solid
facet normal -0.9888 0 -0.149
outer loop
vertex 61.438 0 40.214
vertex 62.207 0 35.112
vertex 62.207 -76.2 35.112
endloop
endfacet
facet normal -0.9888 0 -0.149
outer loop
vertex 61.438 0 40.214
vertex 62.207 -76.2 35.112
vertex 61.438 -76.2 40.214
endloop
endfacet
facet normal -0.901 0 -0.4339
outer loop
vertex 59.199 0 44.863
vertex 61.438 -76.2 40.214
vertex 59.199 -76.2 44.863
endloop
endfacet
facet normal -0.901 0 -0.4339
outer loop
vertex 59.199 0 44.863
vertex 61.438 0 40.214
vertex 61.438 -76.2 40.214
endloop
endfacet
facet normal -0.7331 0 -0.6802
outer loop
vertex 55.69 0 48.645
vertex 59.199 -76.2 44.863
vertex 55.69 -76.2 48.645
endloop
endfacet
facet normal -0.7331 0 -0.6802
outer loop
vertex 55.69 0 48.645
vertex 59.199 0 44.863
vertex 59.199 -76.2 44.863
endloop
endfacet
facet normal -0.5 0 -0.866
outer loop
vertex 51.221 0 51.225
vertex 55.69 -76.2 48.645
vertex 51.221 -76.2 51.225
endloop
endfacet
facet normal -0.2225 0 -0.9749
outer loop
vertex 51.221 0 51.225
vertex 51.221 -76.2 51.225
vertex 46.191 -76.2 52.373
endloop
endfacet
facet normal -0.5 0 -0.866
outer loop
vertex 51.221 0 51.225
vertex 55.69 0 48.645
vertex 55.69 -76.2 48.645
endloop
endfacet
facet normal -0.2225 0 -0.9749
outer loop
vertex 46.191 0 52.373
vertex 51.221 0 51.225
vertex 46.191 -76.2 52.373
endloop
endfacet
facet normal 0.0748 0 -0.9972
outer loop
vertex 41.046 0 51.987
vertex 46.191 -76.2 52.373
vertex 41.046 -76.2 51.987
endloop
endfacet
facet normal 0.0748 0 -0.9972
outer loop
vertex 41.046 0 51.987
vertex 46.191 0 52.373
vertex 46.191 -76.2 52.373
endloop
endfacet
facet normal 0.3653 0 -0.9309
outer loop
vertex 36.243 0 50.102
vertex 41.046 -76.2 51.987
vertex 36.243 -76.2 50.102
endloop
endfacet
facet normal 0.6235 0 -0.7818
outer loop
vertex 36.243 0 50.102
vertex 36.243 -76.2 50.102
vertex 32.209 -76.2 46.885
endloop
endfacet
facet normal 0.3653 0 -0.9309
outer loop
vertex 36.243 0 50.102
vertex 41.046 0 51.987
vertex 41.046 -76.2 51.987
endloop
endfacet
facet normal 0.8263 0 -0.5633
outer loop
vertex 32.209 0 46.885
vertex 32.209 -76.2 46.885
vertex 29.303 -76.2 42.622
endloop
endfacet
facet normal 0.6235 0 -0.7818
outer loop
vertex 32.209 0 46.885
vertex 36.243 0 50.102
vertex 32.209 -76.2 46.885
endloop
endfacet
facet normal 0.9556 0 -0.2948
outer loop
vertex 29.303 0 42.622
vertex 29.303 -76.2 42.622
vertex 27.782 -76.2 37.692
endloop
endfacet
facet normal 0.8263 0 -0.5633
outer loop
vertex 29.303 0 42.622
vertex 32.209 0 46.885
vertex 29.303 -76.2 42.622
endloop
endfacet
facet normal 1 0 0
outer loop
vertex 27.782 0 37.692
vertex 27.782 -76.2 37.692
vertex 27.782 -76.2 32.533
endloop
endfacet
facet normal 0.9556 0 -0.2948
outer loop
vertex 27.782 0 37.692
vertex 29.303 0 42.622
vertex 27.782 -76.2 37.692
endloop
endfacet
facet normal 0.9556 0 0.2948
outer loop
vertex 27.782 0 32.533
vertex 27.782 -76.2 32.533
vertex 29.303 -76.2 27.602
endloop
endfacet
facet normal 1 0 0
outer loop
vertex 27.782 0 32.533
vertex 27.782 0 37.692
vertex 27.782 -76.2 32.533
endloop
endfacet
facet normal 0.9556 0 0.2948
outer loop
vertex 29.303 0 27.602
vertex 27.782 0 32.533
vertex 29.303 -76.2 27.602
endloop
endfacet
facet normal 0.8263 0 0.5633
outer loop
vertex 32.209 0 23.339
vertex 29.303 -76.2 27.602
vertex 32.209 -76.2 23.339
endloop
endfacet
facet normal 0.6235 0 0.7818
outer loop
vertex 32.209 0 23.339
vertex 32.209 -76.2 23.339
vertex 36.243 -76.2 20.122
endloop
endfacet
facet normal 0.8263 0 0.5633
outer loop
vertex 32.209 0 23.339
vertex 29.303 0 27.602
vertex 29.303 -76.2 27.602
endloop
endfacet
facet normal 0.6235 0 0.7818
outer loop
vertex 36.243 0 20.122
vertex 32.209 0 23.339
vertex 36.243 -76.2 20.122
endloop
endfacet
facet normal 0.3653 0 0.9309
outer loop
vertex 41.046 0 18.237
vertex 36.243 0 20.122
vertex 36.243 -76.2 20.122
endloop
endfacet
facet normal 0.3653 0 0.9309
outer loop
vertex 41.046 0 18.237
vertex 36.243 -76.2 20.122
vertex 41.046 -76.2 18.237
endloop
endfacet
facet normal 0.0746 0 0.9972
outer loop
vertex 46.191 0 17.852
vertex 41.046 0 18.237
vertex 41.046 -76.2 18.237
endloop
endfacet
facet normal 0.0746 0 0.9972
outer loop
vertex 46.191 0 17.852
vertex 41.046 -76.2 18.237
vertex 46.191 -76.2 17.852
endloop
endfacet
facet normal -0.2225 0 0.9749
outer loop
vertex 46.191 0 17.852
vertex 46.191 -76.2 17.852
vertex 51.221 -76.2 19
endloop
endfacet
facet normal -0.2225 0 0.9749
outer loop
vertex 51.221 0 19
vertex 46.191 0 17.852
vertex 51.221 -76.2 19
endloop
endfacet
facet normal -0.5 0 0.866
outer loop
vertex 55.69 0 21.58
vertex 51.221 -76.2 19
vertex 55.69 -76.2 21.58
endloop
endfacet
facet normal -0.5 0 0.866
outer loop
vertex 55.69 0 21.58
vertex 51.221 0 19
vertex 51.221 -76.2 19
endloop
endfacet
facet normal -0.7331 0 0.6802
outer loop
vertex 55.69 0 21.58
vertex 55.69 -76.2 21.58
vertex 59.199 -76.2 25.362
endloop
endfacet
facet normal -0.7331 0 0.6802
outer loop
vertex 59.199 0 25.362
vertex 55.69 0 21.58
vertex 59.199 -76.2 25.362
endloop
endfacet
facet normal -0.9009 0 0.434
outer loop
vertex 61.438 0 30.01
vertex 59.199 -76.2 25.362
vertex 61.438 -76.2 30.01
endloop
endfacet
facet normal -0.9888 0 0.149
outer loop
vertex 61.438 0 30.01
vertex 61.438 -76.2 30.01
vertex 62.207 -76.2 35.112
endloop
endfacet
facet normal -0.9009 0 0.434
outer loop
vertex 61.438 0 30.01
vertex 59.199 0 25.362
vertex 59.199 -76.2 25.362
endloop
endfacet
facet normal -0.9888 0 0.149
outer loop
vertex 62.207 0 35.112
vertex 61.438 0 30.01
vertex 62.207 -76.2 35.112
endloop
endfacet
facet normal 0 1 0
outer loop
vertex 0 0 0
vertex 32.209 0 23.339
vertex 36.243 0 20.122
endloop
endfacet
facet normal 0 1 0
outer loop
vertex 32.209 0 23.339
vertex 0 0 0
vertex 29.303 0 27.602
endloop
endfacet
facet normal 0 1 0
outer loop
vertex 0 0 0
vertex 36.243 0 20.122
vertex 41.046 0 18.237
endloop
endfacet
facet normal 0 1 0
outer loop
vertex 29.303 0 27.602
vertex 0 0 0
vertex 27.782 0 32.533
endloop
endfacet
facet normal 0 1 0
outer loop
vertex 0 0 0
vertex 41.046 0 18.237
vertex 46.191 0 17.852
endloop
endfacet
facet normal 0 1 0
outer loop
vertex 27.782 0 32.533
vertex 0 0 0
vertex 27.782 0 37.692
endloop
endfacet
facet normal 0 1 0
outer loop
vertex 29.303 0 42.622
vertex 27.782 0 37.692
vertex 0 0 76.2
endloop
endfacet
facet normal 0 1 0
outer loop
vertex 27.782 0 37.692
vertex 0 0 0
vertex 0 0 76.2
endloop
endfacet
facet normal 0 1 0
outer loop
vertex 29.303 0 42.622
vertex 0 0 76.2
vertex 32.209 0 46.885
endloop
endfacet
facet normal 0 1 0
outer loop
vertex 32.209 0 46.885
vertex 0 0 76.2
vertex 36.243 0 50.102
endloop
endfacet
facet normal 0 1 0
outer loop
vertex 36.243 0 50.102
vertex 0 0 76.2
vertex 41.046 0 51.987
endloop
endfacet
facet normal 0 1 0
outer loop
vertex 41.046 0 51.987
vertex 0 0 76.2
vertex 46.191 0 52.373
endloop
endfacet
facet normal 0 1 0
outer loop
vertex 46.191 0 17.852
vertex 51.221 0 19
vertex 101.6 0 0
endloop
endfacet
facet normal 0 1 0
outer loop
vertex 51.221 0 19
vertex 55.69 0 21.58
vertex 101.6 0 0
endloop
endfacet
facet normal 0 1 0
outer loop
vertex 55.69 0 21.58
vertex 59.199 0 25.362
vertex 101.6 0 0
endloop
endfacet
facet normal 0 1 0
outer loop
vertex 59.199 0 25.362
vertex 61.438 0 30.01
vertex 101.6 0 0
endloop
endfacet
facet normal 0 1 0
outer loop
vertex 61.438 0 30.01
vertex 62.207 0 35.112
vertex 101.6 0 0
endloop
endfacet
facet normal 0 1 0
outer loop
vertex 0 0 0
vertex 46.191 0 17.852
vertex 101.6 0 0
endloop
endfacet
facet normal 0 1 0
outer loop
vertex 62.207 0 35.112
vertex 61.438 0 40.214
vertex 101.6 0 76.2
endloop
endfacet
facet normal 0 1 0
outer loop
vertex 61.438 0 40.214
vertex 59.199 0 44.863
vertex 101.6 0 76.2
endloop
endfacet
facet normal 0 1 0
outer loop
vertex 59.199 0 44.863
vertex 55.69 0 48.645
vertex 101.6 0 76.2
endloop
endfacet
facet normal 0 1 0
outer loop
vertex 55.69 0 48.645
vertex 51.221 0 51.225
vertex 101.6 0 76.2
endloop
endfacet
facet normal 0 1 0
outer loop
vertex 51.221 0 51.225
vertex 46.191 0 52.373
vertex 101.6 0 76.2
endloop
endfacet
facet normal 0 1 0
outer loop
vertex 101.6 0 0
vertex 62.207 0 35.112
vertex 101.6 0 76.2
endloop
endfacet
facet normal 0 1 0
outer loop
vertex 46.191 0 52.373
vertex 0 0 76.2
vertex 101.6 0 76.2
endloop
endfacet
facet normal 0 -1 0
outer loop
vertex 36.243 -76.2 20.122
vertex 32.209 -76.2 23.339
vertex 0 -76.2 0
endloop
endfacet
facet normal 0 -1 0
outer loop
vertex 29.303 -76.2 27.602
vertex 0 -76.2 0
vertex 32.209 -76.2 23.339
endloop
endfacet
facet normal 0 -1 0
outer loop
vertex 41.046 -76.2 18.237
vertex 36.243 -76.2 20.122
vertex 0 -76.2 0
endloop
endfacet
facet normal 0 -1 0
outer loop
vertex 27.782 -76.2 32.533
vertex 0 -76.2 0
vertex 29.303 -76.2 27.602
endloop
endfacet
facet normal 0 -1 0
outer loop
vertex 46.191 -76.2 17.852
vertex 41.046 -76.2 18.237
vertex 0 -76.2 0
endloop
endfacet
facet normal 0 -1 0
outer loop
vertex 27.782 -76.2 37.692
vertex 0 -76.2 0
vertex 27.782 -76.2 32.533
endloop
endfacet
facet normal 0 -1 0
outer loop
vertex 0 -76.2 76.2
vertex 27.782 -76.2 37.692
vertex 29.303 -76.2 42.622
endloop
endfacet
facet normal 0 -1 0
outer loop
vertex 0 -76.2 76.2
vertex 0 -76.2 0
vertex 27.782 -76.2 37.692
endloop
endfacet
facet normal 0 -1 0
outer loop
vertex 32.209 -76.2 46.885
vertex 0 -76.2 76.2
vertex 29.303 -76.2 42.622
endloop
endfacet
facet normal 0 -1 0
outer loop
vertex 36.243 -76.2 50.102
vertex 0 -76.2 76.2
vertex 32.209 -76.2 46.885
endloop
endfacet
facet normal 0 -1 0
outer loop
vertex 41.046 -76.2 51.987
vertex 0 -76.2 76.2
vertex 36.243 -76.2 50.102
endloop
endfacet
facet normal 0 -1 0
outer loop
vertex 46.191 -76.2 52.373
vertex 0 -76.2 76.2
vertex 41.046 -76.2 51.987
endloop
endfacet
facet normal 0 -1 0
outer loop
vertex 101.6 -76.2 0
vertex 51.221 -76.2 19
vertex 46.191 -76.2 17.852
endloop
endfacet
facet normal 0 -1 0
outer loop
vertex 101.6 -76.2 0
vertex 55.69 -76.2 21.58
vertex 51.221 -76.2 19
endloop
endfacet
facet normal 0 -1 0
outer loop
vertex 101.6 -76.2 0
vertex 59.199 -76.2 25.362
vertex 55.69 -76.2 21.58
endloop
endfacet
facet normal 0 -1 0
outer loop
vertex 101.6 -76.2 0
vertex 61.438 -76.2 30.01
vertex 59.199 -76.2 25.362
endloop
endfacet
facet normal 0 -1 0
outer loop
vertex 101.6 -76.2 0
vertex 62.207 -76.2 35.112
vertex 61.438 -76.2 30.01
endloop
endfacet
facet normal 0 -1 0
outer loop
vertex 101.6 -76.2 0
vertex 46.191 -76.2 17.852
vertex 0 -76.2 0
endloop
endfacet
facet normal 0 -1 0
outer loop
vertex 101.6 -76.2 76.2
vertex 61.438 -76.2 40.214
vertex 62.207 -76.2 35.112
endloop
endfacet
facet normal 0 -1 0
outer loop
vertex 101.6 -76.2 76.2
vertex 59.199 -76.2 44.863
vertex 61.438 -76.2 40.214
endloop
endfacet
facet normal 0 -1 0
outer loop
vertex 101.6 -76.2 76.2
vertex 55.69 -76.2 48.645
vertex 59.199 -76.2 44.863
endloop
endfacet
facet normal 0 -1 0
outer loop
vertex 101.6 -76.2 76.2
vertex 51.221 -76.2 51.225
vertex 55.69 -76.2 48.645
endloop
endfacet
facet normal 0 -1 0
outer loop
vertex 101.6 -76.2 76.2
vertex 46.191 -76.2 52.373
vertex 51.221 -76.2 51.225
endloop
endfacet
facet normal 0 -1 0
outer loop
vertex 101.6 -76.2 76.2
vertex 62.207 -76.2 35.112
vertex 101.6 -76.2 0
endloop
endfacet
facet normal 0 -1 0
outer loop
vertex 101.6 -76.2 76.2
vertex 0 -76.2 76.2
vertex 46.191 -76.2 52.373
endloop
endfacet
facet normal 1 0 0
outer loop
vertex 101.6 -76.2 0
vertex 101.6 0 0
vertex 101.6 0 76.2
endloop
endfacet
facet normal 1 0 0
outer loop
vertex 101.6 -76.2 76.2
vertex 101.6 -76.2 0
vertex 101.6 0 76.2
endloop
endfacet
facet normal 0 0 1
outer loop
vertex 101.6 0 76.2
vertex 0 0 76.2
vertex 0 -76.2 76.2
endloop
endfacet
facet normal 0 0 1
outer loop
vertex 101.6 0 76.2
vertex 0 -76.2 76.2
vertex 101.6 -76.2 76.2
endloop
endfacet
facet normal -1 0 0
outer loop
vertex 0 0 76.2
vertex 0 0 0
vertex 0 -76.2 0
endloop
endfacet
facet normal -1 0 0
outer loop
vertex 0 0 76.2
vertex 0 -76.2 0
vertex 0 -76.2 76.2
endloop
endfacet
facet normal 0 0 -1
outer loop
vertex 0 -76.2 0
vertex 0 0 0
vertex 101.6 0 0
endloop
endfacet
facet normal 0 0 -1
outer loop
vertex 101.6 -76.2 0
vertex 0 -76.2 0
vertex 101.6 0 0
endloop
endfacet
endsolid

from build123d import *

# Parameters (mm, degrees)
F0_W     = 101.6
F0_H     = 76.2
F1_DEPTH = 76.2
F2_R     = 17.309068
F3_DEPTH = 76.2


with BuildPart() as f1:
    # F0 (on Front) → F1 (new body)
    with BuildSketch(Plane.XZ):
        with Locations((50.8, 38.1)):
            Rectangle(F0_W, F0_H)
    extrude(amount=F1_DEPTH)

    # F2 (on Front) → F3 (cut, through all)
    with BuildSketch(Plane.XZ):
        with Locations((44.897694, 35.112303)):
            Circle(F2_R)
    extrude(amount=F3_DEPTH, mode=Mode.SUBTRACT)


solid = f1.part
